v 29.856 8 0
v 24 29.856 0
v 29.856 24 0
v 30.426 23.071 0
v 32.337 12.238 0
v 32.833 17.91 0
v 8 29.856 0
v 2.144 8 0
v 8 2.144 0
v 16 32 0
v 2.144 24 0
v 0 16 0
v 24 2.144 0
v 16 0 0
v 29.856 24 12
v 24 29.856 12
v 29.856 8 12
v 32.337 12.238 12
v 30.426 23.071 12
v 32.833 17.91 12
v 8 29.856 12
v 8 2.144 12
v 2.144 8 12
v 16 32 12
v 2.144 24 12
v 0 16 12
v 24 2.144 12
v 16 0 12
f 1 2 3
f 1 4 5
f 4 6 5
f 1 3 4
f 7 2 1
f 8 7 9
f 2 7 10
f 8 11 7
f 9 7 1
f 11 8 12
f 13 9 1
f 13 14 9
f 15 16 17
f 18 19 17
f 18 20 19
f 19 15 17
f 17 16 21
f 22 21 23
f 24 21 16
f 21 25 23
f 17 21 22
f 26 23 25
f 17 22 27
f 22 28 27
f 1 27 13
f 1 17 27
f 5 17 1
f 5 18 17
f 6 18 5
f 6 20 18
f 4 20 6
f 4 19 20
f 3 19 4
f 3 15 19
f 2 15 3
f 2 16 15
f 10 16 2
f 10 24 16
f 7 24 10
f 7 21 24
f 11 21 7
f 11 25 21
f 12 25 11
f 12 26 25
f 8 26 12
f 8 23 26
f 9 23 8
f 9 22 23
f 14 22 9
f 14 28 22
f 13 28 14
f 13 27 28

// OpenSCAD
$fn = 32;

// ----------------------------------------------------------------------
// Eccentric disc: egg, 12 mm thick
// ----------------------------------------------------------------------

// --- parameters (mm) ---
profile_height = 12;      // extrusion height
profile_points = 14;      // points of the closed outline

profile = [[0, 16], [2.144, 8], [8, 2.144], [16, 0], [24, 2.144], [29.856, 8], [32.337, 12.238], [32.833, 17.91], [30.426, 23.071], [29.856, 24], [24, 29.856], [16, 32], [8, 29.856], [2.144, 24]];  // single closed polygon, 14 points, counter clockwise

// --- the one profile operation ---
linear_extrude(height = profile_height) polygon(points = profile);
